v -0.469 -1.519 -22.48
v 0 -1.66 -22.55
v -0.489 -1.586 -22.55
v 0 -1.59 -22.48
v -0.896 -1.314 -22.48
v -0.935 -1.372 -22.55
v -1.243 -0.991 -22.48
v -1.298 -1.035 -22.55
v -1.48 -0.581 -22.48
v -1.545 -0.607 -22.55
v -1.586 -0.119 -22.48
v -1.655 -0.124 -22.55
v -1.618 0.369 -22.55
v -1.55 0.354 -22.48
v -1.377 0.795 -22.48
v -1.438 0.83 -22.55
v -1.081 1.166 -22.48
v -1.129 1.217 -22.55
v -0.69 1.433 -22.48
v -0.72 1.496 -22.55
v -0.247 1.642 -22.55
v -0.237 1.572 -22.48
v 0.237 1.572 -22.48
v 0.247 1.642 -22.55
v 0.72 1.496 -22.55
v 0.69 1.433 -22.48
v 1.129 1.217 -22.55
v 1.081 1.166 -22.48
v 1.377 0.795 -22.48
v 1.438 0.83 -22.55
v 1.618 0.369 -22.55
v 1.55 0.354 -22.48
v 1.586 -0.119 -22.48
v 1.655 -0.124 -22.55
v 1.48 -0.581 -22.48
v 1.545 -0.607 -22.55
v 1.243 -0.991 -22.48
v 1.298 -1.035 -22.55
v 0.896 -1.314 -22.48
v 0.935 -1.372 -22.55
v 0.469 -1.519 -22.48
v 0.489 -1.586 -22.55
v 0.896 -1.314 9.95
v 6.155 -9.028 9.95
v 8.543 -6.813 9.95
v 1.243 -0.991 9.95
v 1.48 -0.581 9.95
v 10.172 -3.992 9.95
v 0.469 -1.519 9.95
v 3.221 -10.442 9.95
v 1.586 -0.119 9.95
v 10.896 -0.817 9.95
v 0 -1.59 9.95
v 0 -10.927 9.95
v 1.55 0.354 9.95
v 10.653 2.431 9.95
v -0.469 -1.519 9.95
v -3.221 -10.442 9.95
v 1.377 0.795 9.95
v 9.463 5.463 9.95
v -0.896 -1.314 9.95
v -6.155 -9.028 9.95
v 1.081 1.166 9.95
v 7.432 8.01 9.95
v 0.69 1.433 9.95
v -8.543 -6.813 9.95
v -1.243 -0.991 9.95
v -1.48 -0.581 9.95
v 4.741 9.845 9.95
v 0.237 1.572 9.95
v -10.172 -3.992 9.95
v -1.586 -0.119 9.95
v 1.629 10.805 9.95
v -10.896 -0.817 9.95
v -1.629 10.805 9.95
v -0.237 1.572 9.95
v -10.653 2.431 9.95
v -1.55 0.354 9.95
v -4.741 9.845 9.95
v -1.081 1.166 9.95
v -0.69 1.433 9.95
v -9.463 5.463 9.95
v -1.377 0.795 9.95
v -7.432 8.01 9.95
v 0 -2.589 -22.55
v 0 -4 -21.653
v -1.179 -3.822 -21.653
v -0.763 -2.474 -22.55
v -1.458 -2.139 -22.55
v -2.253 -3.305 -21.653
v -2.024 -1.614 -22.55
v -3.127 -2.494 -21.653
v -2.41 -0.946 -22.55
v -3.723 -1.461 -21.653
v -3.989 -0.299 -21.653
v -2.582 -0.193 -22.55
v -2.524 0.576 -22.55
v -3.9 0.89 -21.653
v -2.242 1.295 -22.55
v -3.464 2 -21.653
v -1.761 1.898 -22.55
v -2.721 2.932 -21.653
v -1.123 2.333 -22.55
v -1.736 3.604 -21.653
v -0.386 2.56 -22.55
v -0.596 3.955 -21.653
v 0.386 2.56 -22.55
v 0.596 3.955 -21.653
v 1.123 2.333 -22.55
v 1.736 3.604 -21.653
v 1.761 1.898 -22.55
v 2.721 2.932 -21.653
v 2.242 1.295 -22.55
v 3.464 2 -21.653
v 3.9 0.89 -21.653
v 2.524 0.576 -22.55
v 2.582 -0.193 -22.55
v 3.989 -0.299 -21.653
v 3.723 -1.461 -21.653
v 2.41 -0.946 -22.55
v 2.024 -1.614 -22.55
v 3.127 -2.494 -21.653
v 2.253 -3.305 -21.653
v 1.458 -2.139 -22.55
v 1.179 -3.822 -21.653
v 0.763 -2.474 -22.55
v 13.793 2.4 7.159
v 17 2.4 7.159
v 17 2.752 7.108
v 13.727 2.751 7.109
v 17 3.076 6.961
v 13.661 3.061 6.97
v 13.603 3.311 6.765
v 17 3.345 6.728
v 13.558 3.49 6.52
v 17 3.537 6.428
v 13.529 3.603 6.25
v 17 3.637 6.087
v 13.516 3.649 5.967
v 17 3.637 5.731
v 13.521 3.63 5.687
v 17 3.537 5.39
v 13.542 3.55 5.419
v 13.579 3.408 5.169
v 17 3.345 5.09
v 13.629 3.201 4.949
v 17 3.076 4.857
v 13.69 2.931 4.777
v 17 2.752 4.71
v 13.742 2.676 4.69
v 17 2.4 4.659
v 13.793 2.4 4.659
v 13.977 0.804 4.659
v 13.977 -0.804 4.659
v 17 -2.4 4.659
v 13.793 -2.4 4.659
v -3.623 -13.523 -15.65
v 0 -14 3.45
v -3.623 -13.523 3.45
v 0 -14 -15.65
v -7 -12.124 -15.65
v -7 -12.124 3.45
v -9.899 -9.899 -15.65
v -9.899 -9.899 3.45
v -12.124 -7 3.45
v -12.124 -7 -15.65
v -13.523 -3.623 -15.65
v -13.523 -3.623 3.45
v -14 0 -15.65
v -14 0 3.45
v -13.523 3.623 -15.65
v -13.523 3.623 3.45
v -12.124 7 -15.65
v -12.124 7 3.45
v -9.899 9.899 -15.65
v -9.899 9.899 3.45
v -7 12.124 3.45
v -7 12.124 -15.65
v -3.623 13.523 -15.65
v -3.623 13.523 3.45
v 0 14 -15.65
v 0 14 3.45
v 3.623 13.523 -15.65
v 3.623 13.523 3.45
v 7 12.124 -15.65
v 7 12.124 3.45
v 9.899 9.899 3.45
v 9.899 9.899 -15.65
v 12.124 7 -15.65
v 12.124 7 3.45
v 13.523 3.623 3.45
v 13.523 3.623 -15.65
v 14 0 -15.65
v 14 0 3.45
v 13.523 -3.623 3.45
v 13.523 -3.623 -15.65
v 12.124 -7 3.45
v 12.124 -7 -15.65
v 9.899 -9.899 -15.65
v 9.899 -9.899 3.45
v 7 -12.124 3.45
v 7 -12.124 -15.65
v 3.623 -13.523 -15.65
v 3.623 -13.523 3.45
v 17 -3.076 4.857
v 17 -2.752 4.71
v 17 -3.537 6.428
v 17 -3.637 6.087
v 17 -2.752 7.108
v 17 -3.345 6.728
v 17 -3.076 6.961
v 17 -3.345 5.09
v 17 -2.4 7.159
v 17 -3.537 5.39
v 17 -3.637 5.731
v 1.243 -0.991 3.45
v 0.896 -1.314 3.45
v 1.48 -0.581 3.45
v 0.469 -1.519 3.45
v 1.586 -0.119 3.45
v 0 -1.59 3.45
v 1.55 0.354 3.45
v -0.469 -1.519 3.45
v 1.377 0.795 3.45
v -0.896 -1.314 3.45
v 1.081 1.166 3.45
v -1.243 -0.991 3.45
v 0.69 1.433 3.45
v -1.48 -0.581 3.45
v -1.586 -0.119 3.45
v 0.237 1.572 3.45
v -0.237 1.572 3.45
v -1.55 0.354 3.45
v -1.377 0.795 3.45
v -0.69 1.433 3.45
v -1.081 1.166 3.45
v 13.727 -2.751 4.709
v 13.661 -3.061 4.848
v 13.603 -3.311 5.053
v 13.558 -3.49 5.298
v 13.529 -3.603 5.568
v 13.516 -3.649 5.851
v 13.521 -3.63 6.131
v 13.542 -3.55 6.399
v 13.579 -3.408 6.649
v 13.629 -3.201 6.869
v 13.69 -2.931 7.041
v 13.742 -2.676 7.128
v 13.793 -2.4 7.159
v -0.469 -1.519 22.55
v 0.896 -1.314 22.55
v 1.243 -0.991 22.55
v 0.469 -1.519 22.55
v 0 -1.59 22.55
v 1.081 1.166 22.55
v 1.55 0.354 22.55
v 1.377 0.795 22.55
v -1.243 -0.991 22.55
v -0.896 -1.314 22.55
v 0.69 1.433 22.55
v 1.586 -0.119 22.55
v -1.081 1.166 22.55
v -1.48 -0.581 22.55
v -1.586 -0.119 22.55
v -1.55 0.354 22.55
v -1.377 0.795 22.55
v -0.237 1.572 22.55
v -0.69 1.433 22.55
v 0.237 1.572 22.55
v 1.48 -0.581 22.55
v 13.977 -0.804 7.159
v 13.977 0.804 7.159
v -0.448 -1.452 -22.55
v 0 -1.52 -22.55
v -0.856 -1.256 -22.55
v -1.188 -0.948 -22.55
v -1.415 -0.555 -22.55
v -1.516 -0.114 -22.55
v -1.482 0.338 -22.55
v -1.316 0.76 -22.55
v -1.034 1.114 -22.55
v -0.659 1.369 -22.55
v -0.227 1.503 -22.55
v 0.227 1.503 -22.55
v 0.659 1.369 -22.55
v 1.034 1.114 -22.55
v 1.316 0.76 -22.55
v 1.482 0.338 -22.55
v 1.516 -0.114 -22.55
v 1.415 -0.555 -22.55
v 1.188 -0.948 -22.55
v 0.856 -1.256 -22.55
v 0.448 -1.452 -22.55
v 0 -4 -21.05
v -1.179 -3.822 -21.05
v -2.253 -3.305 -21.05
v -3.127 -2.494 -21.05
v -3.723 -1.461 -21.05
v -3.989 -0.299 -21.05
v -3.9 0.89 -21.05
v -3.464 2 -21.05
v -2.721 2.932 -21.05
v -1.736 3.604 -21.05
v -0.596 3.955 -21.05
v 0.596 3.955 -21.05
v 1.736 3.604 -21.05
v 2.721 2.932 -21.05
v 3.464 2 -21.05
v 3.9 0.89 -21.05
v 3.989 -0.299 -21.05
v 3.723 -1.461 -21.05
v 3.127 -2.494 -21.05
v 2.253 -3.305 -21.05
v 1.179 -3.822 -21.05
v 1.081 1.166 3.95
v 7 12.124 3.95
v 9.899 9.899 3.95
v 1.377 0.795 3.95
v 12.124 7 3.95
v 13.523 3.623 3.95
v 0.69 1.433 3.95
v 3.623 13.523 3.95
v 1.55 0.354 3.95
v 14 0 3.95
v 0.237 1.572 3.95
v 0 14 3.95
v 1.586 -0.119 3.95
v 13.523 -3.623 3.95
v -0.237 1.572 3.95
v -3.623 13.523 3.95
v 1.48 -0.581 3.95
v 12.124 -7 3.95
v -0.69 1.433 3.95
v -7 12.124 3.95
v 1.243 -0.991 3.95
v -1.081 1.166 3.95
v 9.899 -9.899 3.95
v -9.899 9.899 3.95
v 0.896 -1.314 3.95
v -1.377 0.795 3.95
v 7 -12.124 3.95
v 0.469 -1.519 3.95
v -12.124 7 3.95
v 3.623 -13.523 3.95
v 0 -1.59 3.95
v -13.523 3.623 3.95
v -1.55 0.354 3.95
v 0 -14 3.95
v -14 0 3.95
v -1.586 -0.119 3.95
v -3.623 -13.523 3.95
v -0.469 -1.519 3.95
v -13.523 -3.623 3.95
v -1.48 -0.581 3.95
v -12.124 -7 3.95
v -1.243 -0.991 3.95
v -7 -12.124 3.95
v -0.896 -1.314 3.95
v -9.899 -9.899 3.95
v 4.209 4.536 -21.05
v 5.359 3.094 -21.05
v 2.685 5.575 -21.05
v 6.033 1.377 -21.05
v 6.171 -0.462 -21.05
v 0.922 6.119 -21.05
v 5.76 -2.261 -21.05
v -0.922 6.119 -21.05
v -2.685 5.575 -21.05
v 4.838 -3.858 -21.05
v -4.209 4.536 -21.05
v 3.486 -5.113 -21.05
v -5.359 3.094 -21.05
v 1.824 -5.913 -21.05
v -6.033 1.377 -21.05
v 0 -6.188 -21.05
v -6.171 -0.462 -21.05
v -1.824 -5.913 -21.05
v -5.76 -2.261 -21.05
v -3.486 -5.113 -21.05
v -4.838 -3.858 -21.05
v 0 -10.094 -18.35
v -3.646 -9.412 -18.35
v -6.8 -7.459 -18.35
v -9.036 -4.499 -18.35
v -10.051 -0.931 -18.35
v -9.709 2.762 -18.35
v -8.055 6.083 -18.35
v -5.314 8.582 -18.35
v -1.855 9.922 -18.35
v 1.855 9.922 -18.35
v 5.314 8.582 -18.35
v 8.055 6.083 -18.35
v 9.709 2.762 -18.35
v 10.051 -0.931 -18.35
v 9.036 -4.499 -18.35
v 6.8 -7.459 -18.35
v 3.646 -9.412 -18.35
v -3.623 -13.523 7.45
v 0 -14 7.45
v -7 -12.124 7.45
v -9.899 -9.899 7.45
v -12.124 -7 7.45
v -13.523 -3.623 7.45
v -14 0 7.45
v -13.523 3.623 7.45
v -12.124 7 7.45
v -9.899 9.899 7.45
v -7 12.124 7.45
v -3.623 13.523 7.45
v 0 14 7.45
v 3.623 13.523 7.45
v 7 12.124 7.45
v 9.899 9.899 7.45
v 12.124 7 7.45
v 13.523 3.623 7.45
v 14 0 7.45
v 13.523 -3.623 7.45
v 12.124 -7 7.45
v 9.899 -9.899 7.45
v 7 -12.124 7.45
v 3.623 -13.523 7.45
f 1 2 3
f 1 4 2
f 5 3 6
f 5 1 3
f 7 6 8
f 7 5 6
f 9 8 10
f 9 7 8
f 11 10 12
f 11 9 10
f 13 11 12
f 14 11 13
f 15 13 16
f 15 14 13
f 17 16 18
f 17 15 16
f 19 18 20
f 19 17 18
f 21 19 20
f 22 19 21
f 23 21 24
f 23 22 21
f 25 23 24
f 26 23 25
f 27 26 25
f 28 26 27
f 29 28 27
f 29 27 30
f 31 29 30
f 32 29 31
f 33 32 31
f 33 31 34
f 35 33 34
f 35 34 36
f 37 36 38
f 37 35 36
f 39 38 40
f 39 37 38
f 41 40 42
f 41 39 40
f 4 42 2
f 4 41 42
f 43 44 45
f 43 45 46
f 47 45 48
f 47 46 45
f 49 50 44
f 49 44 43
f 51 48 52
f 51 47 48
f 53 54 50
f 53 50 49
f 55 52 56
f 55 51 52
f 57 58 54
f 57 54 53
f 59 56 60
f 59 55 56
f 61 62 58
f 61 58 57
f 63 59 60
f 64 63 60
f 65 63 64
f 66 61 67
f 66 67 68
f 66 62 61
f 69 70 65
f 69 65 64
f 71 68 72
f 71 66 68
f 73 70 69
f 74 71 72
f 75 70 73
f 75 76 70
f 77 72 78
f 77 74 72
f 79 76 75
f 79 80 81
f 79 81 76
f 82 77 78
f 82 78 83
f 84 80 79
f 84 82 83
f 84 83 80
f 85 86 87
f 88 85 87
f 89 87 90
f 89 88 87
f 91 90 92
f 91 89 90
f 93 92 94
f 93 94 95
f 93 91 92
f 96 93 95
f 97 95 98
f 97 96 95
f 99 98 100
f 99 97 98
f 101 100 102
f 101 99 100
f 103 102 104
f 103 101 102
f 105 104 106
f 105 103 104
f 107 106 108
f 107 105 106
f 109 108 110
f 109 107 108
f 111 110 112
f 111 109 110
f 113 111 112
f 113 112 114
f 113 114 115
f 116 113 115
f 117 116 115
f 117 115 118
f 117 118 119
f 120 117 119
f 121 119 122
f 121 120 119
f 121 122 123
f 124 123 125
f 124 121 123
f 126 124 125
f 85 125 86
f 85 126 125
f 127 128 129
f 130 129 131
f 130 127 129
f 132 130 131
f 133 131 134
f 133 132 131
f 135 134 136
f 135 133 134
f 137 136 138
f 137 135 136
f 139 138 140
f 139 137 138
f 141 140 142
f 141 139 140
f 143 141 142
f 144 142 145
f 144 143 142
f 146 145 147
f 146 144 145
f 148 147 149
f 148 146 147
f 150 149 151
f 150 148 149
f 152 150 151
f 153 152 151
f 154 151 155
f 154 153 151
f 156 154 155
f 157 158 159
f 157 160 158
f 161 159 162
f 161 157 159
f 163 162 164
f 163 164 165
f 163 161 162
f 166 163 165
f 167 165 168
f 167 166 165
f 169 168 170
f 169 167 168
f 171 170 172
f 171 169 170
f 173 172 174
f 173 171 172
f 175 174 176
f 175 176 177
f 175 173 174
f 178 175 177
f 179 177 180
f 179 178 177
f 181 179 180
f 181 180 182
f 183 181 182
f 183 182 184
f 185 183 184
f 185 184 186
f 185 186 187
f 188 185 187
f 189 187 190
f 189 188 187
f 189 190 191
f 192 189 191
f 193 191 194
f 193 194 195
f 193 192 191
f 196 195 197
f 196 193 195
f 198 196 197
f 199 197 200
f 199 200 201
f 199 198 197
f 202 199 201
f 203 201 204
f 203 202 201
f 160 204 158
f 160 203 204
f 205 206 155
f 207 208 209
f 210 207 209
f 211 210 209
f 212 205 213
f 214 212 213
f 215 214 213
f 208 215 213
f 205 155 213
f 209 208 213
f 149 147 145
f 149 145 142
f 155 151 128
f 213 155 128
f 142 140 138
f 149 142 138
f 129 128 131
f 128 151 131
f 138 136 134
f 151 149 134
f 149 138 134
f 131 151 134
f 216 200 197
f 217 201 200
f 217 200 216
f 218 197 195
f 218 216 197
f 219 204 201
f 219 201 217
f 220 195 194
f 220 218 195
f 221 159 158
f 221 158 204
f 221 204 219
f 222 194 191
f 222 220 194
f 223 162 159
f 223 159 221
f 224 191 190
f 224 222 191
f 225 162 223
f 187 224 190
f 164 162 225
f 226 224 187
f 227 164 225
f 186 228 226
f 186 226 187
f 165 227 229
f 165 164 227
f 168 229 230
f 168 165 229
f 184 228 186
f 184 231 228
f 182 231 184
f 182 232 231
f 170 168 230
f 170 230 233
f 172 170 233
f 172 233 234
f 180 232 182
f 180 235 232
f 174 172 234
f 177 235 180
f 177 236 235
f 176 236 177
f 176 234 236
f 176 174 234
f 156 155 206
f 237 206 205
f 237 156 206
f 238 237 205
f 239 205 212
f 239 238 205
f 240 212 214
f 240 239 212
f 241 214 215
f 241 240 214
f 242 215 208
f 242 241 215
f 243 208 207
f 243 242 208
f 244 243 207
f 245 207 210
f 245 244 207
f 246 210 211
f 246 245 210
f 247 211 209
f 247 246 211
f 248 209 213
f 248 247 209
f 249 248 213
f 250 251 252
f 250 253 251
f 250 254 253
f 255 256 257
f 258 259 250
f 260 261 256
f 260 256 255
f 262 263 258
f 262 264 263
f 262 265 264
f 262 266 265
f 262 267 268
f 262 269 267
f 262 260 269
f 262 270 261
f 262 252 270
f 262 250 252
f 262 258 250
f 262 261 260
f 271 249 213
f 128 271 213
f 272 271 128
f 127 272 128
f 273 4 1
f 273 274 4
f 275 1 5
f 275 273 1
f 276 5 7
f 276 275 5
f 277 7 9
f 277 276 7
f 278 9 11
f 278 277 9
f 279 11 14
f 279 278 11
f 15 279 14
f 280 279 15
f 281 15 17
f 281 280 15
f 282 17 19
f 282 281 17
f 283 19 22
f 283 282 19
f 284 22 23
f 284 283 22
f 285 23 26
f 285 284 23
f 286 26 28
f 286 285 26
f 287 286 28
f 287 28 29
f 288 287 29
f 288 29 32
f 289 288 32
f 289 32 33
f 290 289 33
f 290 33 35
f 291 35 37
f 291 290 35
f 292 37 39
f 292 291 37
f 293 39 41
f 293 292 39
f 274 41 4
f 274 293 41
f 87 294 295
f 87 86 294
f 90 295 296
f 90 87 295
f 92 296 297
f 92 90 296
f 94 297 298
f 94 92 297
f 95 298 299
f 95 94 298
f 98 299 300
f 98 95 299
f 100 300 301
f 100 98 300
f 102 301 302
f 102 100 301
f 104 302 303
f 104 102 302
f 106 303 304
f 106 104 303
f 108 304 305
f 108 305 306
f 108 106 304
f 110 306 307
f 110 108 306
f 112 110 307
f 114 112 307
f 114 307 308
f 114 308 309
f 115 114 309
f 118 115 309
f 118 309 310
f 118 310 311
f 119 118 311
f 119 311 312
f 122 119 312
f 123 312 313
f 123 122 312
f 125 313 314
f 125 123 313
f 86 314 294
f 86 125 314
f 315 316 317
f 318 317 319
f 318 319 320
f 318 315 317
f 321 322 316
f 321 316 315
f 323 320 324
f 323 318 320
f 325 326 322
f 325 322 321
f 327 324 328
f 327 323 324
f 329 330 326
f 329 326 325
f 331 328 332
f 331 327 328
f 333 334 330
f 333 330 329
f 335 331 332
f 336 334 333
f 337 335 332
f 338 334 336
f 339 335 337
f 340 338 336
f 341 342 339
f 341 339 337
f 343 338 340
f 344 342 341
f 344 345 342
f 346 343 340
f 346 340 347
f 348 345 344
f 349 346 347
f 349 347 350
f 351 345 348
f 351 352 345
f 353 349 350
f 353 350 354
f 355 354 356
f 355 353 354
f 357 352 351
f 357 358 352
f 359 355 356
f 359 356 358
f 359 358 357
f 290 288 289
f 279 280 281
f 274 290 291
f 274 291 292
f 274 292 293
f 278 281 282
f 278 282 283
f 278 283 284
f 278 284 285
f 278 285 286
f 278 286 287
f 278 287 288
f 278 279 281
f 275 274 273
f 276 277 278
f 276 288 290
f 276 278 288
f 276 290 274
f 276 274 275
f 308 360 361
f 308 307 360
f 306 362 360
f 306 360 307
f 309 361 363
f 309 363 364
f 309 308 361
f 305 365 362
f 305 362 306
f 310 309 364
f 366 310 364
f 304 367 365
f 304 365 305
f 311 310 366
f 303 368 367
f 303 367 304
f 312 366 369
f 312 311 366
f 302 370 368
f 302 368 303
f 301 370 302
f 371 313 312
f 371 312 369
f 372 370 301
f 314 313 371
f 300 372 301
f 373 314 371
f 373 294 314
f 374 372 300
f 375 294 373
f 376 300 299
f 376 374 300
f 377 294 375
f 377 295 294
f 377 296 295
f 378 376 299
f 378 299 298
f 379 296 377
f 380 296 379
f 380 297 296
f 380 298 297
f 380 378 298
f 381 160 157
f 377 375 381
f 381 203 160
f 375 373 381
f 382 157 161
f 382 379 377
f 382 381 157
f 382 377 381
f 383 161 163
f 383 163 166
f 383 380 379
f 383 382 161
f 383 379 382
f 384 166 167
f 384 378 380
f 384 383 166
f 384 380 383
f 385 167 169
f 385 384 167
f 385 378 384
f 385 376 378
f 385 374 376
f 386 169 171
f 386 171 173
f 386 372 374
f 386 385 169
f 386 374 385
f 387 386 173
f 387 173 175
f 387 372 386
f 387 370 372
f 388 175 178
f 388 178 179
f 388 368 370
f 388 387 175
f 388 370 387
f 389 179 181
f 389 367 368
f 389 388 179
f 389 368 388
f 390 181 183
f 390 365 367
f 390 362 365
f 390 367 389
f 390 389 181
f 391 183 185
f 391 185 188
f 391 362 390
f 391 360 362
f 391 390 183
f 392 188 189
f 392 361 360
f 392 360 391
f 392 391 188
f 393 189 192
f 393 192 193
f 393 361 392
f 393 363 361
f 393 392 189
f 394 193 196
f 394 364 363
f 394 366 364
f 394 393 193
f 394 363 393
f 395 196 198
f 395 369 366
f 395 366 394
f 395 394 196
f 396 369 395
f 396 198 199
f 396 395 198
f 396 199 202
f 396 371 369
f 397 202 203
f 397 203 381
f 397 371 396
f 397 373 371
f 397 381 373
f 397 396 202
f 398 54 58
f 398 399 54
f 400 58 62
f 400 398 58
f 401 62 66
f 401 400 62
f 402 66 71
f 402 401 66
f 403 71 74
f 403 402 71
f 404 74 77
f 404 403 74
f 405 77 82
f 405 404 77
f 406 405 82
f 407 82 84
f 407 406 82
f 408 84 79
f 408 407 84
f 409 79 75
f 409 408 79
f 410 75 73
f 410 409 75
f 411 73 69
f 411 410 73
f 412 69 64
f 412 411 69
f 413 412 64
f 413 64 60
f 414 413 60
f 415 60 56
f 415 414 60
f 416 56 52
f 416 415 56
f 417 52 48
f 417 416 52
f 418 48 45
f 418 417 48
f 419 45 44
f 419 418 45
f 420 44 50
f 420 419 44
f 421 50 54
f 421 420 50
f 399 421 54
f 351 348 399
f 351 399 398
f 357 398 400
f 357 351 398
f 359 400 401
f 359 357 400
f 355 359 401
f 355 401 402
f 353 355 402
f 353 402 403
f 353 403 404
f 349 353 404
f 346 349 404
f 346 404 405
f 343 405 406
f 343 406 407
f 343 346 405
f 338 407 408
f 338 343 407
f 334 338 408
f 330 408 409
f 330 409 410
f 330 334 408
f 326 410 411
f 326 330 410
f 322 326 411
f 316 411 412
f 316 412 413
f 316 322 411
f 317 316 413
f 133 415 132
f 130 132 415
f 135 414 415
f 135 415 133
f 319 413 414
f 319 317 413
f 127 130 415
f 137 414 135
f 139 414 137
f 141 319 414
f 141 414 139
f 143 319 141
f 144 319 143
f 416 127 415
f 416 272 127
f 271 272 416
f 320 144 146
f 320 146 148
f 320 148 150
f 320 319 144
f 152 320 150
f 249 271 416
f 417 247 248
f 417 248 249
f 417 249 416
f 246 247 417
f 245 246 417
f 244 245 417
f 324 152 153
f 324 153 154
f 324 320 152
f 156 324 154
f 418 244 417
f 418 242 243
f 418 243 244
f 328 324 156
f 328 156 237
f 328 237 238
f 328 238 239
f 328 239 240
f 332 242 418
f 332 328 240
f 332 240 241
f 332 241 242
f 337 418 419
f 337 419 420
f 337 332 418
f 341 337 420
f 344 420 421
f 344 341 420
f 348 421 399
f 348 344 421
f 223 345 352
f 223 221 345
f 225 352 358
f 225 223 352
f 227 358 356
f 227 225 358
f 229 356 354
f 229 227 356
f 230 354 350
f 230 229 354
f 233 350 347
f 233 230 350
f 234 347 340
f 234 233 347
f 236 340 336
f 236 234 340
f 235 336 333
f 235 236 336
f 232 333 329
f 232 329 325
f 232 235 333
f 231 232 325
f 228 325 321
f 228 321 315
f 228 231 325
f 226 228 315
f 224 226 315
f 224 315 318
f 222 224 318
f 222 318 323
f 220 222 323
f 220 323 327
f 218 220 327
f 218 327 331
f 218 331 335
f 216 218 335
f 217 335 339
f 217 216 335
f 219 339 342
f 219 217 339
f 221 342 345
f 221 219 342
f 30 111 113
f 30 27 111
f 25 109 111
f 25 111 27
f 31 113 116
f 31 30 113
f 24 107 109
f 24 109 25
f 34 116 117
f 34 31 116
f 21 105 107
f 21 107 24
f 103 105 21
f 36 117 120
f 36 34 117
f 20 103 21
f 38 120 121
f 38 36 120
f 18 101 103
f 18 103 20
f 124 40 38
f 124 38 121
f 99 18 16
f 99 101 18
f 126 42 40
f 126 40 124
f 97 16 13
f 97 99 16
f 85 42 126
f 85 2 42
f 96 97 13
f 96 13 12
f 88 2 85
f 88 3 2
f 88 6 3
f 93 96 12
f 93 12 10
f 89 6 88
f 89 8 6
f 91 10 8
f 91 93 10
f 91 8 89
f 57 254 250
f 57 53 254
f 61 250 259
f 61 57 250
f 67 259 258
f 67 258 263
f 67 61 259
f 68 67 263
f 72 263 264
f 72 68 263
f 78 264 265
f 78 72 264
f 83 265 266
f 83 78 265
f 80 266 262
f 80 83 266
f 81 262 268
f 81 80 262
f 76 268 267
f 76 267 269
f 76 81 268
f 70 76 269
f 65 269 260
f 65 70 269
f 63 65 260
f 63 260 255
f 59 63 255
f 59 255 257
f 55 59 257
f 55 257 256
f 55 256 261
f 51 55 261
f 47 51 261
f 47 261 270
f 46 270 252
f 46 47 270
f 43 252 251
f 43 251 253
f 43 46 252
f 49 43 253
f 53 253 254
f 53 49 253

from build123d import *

# Parameters (mm, degrees)
BOSS_EXTRUDE1_DEPTH = 17


with BuildPart() as part:
    # Sketch1 → Revolve1 (revolve)
    with BuildSketch(Plane(origin=(0, 0, 0), x_dir=(0, 0, -1), z_dir=(1, 0, 0)), mode=Mode.PRIVATE) as revolve1_sk:
        Polygon((-22.55, 0), (-22.55, 1.59), (-9.95, 1.59), (-9.95, 10.926977996), (-7.45, 14), (-3.95, 14), (-3.95, 1.59), (-3.45, 1.59), (-3.45, 14), (15.65, 14), (21.05, 6.187841706), (21.05, 4), (21.652703363, 4), (22.55, 2.589018231), (22.55, 1.660098946), (22.479901054, 1.59), (22.55, 1.519901054), (22.55, 0), align=None)
    revolve(revolve1_sk.sketch.rotate(Axis((0, 0, 22.55), (0, 0, -1)), 180), axis=Axis((0, 0, 22.55), (0, 0, -1)))

    # Sketch2 → Boss-Extrude1 (add)
    with BuildSketch(Plane(origin=(0, 0, 0), x_dir=(0, 0, -1), z_dir=(1, 0, 0))):
        with BuildLine():
            Line((-4.658936123, 2.4), (-4.658936123, -2.4))
            ThreePointArc((-4.658936123, -2.4), (-5.908936123, -3.65), (-7.158936123, -2.4))
            Line((-7.158936123, -2.4), (-7.158936123, 2.4))
            ThreePointArc((-7.158936123, 2.4), (-5.908936123, 3.65), (-4.658936123, 2.4))
        make_face()
    extrude(amount=BOSS_EXTRUDE1_DEPTH)


solid = part.part
